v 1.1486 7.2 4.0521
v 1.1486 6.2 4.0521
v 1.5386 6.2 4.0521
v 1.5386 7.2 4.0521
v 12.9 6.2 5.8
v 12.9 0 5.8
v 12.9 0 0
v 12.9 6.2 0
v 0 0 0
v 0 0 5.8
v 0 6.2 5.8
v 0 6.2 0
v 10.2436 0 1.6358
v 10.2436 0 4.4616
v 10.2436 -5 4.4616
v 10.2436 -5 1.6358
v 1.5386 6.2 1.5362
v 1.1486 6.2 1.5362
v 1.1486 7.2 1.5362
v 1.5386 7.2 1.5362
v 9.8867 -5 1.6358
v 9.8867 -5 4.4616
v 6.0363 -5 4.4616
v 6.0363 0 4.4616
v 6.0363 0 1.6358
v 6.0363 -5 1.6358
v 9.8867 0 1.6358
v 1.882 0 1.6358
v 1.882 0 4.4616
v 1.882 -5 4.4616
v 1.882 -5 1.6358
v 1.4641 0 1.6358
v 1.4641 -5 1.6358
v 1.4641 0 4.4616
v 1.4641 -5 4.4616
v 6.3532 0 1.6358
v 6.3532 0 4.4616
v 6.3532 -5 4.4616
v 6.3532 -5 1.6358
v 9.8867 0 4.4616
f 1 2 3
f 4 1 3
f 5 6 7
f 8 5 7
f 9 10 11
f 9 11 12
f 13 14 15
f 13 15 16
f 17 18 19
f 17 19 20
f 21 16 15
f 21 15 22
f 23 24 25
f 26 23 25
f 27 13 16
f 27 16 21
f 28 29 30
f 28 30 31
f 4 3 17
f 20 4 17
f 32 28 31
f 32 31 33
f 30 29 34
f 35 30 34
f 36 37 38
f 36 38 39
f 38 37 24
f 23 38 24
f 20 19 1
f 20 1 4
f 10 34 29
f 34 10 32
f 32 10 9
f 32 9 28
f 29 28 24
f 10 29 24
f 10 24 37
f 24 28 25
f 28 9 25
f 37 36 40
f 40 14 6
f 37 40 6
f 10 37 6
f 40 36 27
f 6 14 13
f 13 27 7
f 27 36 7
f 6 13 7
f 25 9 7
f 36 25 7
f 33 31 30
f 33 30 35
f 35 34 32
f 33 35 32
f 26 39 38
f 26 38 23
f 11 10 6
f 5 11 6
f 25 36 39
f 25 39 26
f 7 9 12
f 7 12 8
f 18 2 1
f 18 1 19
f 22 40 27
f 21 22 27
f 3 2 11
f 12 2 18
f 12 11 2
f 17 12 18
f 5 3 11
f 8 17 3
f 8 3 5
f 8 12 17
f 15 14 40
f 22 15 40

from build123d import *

# Parameters (mm, degrees)
SKETCH1_W           = 12.9
SKETCH1_H           = 5.8
BOSS_EXTRUDE1_DEPTH = 6.2
SKETCH2_W           = 0.389977013
SKETCH2_H           = 2.515896803
BOSS_EXTRUDE2_DEPTH = 1
SKETCH3_W           = 0.417854015
SKETCH3_H           = 2.825804308
SKETCH3_W_2         = 0.316823763
SKETCH3_W_3         = 0.356926389
BOSS_EXTRUDE3_DEPTH = 5


with BuildPart() as part:
    # Sketch1 → Boss-Extrude1 (new body)
    with BuildSketch(Plane(origin=(0, 0, 0), x_dir=(1, 0, 0), z_dir=(0, 1, 0))):
        with Locations((6.45, -2.9)):
            Rectangle(SKETCH1_W, SKETCH1_H)
    extrude(amount=BOSS_EXTRUDE1_DEPTH)

    # Sketch2 → Boss-Extrude2 (add)
    with BuildSketch(Plane(origin=(0, 6.2, 0), x_dir=(1, 0, 0), z_dir=(0, 1, 0))):
        with Locations((1.343594609, -2.794175743)):
            Rectangle(SKETCH2_W, SKETCH2_H)
    extrude(amount=BOSS_EXTRUDE2_DEPTH)

    # Sketch3 → Boss-Extrude3 (add)
    with BuildSketch(Plane(origin=(0, 0, 0), x_dir=(-1, 0, 0), z_dir=(0, -1, 0))):
        with Locations((-1.673057287, -3.048690626)):
            Rectangle(SKETCH3_W, SKETCH3_H)
        with Locations((-6.194757306, -3.048690626)):
            Rectangle(SKETCH3_W_2, SKETCH3_H)
        with Locations((-10.065176498, -3.048690626)):
            Rectangle(SKETCH3_W_3, SKETCH3_H)
    extrude(amount=BOSS_EXTRUDE3_DEPTH)


solid = part.part
